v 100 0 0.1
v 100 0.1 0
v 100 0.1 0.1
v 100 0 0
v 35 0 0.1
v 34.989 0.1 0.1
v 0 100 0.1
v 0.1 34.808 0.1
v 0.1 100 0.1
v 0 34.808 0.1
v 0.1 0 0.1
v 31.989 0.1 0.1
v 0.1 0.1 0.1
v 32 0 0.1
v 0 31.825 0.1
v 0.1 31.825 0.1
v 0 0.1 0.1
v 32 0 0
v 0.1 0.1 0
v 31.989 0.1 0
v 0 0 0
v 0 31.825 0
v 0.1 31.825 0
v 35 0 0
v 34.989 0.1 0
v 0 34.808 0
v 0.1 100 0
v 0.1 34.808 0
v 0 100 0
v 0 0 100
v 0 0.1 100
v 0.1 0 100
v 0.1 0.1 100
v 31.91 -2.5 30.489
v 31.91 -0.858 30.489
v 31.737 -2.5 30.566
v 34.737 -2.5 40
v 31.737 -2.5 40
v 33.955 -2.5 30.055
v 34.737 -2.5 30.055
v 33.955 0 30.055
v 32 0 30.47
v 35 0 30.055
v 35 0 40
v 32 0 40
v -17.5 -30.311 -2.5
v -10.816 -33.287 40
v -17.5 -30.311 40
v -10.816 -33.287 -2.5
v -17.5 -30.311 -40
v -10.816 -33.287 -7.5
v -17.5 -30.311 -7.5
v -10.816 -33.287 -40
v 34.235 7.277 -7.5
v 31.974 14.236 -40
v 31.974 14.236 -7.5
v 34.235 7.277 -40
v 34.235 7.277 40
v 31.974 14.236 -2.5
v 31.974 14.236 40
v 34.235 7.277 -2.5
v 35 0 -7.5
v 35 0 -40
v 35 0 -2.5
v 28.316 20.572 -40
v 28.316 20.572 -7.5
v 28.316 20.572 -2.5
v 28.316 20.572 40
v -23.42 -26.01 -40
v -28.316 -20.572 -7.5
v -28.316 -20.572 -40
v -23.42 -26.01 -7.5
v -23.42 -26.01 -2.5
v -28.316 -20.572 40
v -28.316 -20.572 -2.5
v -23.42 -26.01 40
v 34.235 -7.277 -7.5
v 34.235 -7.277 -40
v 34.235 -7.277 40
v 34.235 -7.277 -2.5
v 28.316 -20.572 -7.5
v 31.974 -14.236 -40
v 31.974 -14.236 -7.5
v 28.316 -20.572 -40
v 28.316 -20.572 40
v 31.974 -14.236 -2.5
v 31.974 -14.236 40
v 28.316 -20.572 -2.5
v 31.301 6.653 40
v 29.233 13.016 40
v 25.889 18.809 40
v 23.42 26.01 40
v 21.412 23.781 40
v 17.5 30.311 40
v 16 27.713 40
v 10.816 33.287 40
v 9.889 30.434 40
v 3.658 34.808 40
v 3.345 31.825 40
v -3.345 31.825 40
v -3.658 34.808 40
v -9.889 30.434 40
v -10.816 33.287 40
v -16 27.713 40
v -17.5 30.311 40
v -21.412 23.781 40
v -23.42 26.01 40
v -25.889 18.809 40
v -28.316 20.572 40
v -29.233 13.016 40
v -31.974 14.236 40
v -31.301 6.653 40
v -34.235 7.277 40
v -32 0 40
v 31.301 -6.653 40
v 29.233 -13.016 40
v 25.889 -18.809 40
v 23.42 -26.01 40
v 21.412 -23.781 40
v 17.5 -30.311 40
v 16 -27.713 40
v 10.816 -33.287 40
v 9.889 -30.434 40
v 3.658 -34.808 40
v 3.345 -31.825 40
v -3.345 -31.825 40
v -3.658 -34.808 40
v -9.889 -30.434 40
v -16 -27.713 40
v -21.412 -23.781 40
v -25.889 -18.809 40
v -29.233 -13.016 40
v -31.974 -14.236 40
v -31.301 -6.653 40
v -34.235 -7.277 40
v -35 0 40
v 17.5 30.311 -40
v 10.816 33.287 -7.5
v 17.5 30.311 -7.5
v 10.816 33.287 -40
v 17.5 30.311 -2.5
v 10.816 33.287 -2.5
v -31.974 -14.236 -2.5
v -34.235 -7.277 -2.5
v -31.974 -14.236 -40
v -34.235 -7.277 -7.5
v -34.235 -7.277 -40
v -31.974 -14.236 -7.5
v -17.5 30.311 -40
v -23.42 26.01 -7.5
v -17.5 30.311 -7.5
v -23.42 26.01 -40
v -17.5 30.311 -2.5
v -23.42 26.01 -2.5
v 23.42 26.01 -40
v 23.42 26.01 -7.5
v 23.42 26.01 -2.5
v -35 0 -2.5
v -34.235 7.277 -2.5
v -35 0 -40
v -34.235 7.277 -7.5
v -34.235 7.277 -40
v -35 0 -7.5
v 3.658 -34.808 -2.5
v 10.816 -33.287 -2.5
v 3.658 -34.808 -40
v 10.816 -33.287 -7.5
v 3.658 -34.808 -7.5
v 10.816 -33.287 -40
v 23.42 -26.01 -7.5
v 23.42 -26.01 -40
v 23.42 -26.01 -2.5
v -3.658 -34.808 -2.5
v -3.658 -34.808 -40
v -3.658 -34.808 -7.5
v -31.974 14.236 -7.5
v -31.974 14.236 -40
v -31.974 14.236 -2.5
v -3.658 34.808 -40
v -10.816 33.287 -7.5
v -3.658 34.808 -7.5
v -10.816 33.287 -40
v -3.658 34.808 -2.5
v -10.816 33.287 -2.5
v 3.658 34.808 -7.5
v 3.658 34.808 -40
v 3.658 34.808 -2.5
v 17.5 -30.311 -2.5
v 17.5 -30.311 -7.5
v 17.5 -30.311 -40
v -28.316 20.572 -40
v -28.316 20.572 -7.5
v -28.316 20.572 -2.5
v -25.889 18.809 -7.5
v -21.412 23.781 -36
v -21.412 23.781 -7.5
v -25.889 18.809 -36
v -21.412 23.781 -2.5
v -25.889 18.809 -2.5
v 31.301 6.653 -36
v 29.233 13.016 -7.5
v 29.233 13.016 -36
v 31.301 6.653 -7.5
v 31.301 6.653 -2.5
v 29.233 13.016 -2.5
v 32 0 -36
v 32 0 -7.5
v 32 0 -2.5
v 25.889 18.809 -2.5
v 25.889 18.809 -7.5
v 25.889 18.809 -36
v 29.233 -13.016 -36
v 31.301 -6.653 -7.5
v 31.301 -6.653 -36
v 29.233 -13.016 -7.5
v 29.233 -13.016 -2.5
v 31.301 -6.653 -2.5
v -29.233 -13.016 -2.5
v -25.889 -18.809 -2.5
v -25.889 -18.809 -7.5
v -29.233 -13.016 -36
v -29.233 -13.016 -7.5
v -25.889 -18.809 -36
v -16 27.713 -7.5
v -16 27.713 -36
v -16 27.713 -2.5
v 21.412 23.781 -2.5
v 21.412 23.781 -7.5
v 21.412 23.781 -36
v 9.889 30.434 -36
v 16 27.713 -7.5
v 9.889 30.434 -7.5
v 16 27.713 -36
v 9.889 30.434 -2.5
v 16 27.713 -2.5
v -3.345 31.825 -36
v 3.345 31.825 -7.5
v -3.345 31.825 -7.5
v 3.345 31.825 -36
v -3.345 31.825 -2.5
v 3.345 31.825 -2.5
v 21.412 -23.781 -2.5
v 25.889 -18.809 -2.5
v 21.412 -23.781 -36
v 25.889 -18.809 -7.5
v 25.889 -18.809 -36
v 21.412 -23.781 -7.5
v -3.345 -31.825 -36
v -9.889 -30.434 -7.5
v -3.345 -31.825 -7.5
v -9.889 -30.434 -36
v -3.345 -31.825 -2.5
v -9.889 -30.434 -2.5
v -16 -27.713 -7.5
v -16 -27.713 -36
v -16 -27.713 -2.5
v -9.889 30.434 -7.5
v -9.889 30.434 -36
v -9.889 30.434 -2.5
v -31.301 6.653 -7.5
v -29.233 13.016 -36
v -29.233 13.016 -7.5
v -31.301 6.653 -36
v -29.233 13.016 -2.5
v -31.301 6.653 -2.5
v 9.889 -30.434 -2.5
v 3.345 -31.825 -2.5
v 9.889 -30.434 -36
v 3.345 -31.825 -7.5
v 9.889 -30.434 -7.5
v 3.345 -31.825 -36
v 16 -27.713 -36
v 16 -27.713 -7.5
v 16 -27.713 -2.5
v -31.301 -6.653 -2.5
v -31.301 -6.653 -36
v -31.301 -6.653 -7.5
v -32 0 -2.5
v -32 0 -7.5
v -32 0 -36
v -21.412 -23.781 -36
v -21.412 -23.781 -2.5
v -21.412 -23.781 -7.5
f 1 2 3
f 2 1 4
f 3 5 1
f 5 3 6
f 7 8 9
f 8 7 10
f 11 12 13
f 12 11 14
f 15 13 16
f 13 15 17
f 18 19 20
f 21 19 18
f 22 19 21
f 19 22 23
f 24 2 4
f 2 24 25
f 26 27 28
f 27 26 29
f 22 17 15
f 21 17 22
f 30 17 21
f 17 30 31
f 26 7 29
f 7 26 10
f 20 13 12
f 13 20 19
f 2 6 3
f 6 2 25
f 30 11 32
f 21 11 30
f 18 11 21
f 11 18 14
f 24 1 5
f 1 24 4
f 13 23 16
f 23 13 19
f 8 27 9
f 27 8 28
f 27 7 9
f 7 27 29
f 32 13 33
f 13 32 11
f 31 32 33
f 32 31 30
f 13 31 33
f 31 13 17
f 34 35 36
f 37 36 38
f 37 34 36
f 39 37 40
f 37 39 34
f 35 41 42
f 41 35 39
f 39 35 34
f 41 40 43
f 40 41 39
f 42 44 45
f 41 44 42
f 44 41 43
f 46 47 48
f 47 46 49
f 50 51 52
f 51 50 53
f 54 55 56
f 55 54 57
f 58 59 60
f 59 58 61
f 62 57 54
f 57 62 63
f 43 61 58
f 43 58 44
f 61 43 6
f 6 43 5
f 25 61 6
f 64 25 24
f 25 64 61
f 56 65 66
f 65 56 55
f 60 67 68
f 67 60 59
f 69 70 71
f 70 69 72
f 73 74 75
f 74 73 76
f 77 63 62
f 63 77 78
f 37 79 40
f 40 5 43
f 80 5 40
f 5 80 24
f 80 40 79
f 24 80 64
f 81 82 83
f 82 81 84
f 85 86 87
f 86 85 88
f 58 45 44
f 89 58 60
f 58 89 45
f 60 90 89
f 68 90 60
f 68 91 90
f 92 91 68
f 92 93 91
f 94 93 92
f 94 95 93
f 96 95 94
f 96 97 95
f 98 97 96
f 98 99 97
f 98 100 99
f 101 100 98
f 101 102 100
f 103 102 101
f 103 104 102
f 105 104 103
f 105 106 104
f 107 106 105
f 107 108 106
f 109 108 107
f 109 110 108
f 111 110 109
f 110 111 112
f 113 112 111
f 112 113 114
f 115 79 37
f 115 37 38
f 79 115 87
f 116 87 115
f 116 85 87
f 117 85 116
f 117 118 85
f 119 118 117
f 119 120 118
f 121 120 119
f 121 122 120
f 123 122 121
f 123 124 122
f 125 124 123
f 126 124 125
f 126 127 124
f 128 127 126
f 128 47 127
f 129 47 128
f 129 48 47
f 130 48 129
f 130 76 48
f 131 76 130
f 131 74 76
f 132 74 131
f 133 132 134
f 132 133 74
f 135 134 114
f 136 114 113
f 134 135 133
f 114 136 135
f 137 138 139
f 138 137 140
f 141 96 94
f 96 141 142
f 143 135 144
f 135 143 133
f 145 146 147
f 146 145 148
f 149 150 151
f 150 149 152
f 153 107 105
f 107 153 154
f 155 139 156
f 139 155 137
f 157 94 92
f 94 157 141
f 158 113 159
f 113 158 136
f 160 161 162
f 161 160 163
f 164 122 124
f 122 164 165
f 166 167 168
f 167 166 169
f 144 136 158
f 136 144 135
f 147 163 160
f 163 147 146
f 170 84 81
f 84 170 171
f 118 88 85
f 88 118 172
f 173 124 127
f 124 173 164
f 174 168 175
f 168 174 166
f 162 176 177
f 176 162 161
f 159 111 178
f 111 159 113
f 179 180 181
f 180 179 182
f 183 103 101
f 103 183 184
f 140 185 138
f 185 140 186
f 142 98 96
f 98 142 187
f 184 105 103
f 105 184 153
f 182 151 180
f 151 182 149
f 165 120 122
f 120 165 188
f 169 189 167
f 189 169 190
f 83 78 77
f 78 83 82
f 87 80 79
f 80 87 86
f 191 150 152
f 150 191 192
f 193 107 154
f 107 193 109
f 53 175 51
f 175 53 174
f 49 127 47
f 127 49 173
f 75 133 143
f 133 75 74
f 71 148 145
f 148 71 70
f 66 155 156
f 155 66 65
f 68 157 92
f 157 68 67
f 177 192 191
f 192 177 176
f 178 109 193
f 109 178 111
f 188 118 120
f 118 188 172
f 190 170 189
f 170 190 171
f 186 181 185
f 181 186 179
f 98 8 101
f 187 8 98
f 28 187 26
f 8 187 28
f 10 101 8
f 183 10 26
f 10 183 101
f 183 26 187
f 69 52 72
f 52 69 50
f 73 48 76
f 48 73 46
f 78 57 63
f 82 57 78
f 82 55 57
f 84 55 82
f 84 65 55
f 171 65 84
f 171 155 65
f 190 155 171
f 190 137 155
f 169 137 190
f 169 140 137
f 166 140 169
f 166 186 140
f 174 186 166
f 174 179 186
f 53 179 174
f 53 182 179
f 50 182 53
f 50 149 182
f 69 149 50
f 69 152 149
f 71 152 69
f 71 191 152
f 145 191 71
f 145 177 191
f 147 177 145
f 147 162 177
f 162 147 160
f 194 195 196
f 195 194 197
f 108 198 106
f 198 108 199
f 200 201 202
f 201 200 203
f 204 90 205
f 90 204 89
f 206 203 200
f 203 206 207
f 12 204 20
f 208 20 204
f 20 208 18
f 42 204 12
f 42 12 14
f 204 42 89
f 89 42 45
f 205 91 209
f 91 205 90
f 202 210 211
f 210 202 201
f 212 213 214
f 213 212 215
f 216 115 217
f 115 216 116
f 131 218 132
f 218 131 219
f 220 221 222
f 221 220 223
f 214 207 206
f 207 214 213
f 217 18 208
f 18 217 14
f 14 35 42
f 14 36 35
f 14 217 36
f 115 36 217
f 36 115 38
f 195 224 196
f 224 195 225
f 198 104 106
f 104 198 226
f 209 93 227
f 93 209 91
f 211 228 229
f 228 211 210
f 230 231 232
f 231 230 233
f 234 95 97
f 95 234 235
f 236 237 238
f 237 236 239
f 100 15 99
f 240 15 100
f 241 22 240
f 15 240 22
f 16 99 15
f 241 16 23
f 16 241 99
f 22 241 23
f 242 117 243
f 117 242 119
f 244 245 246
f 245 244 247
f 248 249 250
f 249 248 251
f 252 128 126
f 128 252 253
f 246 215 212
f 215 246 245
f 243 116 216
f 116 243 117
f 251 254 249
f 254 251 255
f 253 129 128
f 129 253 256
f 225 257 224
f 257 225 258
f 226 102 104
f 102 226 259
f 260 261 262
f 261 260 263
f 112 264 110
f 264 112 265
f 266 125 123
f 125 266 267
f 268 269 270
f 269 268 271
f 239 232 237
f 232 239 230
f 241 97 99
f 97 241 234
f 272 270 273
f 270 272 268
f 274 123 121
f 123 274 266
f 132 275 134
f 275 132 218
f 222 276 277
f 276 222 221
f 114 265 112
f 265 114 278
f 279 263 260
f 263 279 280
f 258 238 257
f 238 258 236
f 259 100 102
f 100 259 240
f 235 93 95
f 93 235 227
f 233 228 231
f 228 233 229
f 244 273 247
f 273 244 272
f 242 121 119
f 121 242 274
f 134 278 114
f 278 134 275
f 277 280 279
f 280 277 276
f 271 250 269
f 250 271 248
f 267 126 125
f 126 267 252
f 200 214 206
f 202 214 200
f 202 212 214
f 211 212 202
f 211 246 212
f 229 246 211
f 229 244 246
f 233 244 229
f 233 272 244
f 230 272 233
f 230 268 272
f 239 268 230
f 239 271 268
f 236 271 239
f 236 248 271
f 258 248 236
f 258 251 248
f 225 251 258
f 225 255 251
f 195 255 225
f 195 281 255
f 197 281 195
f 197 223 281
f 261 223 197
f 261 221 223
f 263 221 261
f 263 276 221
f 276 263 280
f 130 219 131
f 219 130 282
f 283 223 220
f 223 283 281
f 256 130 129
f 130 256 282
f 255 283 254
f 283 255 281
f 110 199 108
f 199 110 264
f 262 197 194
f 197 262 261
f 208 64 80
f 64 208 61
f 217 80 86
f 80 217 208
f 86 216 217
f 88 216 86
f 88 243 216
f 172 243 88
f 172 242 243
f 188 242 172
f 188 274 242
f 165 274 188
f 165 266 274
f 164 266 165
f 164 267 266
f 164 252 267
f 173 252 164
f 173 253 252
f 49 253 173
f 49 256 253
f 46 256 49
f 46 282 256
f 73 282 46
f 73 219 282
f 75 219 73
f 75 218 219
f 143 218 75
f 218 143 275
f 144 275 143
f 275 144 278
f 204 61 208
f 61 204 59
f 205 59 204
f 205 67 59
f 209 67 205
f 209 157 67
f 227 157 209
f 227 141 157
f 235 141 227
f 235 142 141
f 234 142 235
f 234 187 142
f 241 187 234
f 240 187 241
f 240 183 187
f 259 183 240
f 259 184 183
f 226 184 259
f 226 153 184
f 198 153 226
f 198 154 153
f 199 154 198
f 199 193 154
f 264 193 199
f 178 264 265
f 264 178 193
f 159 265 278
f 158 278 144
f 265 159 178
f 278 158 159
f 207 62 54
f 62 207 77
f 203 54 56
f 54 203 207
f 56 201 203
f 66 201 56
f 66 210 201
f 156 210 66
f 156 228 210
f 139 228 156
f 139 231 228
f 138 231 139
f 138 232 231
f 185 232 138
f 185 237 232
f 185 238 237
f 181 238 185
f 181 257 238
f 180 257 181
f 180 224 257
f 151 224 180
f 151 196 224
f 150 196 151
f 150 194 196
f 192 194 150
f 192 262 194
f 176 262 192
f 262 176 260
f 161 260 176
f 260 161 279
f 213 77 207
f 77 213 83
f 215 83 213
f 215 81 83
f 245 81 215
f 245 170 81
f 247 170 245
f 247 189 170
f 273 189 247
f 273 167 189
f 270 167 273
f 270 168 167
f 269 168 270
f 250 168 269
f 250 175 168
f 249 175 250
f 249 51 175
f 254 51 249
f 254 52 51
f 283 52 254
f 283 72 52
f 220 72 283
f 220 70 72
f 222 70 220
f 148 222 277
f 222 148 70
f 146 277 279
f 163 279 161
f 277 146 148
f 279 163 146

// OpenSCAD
    // Combined Scene

    // Permanent Model
    
    // Permanent Model (Black)
    color([0, 0, 0]) {
        // Your permanent model code here
        cube([100,0.1,0.1], center = false);
        cube([0.1,100,0.1], center = false);
        cube([0.1,0.1,100], center = false);
    }
    

    // Dynamic Model
    difference() {
    // Outer mug body with wider top
    cylinder(h=80, r=35, center=true); // Outer cylinder
    
    // Inner hollow space for the mug
    translate([0, 0, 2])
        cylinder(h=76, r=32, center=true); // Inner cylinder for fluid containment, maintaining uniform wall thickness

    // Handle of the mug
    translate([35, 0, 40])
        rotate([90, 0, 0])
            difference() {
                // Outer part of handle
                scale([1, 1, 0.5])
                    cylinder(h=10, r=10, center=true); 

                // Inner cutout of handle
                translate([-5, -5, -5])
                    scale([1, 1, 0.5])
                        cylinder(h=20, r=10, center=true);
            }
    
    // Slightly round the base for stability
    translate([0, 0, -5])
        cylinder(h=5, r=35, center=true);
}
    
